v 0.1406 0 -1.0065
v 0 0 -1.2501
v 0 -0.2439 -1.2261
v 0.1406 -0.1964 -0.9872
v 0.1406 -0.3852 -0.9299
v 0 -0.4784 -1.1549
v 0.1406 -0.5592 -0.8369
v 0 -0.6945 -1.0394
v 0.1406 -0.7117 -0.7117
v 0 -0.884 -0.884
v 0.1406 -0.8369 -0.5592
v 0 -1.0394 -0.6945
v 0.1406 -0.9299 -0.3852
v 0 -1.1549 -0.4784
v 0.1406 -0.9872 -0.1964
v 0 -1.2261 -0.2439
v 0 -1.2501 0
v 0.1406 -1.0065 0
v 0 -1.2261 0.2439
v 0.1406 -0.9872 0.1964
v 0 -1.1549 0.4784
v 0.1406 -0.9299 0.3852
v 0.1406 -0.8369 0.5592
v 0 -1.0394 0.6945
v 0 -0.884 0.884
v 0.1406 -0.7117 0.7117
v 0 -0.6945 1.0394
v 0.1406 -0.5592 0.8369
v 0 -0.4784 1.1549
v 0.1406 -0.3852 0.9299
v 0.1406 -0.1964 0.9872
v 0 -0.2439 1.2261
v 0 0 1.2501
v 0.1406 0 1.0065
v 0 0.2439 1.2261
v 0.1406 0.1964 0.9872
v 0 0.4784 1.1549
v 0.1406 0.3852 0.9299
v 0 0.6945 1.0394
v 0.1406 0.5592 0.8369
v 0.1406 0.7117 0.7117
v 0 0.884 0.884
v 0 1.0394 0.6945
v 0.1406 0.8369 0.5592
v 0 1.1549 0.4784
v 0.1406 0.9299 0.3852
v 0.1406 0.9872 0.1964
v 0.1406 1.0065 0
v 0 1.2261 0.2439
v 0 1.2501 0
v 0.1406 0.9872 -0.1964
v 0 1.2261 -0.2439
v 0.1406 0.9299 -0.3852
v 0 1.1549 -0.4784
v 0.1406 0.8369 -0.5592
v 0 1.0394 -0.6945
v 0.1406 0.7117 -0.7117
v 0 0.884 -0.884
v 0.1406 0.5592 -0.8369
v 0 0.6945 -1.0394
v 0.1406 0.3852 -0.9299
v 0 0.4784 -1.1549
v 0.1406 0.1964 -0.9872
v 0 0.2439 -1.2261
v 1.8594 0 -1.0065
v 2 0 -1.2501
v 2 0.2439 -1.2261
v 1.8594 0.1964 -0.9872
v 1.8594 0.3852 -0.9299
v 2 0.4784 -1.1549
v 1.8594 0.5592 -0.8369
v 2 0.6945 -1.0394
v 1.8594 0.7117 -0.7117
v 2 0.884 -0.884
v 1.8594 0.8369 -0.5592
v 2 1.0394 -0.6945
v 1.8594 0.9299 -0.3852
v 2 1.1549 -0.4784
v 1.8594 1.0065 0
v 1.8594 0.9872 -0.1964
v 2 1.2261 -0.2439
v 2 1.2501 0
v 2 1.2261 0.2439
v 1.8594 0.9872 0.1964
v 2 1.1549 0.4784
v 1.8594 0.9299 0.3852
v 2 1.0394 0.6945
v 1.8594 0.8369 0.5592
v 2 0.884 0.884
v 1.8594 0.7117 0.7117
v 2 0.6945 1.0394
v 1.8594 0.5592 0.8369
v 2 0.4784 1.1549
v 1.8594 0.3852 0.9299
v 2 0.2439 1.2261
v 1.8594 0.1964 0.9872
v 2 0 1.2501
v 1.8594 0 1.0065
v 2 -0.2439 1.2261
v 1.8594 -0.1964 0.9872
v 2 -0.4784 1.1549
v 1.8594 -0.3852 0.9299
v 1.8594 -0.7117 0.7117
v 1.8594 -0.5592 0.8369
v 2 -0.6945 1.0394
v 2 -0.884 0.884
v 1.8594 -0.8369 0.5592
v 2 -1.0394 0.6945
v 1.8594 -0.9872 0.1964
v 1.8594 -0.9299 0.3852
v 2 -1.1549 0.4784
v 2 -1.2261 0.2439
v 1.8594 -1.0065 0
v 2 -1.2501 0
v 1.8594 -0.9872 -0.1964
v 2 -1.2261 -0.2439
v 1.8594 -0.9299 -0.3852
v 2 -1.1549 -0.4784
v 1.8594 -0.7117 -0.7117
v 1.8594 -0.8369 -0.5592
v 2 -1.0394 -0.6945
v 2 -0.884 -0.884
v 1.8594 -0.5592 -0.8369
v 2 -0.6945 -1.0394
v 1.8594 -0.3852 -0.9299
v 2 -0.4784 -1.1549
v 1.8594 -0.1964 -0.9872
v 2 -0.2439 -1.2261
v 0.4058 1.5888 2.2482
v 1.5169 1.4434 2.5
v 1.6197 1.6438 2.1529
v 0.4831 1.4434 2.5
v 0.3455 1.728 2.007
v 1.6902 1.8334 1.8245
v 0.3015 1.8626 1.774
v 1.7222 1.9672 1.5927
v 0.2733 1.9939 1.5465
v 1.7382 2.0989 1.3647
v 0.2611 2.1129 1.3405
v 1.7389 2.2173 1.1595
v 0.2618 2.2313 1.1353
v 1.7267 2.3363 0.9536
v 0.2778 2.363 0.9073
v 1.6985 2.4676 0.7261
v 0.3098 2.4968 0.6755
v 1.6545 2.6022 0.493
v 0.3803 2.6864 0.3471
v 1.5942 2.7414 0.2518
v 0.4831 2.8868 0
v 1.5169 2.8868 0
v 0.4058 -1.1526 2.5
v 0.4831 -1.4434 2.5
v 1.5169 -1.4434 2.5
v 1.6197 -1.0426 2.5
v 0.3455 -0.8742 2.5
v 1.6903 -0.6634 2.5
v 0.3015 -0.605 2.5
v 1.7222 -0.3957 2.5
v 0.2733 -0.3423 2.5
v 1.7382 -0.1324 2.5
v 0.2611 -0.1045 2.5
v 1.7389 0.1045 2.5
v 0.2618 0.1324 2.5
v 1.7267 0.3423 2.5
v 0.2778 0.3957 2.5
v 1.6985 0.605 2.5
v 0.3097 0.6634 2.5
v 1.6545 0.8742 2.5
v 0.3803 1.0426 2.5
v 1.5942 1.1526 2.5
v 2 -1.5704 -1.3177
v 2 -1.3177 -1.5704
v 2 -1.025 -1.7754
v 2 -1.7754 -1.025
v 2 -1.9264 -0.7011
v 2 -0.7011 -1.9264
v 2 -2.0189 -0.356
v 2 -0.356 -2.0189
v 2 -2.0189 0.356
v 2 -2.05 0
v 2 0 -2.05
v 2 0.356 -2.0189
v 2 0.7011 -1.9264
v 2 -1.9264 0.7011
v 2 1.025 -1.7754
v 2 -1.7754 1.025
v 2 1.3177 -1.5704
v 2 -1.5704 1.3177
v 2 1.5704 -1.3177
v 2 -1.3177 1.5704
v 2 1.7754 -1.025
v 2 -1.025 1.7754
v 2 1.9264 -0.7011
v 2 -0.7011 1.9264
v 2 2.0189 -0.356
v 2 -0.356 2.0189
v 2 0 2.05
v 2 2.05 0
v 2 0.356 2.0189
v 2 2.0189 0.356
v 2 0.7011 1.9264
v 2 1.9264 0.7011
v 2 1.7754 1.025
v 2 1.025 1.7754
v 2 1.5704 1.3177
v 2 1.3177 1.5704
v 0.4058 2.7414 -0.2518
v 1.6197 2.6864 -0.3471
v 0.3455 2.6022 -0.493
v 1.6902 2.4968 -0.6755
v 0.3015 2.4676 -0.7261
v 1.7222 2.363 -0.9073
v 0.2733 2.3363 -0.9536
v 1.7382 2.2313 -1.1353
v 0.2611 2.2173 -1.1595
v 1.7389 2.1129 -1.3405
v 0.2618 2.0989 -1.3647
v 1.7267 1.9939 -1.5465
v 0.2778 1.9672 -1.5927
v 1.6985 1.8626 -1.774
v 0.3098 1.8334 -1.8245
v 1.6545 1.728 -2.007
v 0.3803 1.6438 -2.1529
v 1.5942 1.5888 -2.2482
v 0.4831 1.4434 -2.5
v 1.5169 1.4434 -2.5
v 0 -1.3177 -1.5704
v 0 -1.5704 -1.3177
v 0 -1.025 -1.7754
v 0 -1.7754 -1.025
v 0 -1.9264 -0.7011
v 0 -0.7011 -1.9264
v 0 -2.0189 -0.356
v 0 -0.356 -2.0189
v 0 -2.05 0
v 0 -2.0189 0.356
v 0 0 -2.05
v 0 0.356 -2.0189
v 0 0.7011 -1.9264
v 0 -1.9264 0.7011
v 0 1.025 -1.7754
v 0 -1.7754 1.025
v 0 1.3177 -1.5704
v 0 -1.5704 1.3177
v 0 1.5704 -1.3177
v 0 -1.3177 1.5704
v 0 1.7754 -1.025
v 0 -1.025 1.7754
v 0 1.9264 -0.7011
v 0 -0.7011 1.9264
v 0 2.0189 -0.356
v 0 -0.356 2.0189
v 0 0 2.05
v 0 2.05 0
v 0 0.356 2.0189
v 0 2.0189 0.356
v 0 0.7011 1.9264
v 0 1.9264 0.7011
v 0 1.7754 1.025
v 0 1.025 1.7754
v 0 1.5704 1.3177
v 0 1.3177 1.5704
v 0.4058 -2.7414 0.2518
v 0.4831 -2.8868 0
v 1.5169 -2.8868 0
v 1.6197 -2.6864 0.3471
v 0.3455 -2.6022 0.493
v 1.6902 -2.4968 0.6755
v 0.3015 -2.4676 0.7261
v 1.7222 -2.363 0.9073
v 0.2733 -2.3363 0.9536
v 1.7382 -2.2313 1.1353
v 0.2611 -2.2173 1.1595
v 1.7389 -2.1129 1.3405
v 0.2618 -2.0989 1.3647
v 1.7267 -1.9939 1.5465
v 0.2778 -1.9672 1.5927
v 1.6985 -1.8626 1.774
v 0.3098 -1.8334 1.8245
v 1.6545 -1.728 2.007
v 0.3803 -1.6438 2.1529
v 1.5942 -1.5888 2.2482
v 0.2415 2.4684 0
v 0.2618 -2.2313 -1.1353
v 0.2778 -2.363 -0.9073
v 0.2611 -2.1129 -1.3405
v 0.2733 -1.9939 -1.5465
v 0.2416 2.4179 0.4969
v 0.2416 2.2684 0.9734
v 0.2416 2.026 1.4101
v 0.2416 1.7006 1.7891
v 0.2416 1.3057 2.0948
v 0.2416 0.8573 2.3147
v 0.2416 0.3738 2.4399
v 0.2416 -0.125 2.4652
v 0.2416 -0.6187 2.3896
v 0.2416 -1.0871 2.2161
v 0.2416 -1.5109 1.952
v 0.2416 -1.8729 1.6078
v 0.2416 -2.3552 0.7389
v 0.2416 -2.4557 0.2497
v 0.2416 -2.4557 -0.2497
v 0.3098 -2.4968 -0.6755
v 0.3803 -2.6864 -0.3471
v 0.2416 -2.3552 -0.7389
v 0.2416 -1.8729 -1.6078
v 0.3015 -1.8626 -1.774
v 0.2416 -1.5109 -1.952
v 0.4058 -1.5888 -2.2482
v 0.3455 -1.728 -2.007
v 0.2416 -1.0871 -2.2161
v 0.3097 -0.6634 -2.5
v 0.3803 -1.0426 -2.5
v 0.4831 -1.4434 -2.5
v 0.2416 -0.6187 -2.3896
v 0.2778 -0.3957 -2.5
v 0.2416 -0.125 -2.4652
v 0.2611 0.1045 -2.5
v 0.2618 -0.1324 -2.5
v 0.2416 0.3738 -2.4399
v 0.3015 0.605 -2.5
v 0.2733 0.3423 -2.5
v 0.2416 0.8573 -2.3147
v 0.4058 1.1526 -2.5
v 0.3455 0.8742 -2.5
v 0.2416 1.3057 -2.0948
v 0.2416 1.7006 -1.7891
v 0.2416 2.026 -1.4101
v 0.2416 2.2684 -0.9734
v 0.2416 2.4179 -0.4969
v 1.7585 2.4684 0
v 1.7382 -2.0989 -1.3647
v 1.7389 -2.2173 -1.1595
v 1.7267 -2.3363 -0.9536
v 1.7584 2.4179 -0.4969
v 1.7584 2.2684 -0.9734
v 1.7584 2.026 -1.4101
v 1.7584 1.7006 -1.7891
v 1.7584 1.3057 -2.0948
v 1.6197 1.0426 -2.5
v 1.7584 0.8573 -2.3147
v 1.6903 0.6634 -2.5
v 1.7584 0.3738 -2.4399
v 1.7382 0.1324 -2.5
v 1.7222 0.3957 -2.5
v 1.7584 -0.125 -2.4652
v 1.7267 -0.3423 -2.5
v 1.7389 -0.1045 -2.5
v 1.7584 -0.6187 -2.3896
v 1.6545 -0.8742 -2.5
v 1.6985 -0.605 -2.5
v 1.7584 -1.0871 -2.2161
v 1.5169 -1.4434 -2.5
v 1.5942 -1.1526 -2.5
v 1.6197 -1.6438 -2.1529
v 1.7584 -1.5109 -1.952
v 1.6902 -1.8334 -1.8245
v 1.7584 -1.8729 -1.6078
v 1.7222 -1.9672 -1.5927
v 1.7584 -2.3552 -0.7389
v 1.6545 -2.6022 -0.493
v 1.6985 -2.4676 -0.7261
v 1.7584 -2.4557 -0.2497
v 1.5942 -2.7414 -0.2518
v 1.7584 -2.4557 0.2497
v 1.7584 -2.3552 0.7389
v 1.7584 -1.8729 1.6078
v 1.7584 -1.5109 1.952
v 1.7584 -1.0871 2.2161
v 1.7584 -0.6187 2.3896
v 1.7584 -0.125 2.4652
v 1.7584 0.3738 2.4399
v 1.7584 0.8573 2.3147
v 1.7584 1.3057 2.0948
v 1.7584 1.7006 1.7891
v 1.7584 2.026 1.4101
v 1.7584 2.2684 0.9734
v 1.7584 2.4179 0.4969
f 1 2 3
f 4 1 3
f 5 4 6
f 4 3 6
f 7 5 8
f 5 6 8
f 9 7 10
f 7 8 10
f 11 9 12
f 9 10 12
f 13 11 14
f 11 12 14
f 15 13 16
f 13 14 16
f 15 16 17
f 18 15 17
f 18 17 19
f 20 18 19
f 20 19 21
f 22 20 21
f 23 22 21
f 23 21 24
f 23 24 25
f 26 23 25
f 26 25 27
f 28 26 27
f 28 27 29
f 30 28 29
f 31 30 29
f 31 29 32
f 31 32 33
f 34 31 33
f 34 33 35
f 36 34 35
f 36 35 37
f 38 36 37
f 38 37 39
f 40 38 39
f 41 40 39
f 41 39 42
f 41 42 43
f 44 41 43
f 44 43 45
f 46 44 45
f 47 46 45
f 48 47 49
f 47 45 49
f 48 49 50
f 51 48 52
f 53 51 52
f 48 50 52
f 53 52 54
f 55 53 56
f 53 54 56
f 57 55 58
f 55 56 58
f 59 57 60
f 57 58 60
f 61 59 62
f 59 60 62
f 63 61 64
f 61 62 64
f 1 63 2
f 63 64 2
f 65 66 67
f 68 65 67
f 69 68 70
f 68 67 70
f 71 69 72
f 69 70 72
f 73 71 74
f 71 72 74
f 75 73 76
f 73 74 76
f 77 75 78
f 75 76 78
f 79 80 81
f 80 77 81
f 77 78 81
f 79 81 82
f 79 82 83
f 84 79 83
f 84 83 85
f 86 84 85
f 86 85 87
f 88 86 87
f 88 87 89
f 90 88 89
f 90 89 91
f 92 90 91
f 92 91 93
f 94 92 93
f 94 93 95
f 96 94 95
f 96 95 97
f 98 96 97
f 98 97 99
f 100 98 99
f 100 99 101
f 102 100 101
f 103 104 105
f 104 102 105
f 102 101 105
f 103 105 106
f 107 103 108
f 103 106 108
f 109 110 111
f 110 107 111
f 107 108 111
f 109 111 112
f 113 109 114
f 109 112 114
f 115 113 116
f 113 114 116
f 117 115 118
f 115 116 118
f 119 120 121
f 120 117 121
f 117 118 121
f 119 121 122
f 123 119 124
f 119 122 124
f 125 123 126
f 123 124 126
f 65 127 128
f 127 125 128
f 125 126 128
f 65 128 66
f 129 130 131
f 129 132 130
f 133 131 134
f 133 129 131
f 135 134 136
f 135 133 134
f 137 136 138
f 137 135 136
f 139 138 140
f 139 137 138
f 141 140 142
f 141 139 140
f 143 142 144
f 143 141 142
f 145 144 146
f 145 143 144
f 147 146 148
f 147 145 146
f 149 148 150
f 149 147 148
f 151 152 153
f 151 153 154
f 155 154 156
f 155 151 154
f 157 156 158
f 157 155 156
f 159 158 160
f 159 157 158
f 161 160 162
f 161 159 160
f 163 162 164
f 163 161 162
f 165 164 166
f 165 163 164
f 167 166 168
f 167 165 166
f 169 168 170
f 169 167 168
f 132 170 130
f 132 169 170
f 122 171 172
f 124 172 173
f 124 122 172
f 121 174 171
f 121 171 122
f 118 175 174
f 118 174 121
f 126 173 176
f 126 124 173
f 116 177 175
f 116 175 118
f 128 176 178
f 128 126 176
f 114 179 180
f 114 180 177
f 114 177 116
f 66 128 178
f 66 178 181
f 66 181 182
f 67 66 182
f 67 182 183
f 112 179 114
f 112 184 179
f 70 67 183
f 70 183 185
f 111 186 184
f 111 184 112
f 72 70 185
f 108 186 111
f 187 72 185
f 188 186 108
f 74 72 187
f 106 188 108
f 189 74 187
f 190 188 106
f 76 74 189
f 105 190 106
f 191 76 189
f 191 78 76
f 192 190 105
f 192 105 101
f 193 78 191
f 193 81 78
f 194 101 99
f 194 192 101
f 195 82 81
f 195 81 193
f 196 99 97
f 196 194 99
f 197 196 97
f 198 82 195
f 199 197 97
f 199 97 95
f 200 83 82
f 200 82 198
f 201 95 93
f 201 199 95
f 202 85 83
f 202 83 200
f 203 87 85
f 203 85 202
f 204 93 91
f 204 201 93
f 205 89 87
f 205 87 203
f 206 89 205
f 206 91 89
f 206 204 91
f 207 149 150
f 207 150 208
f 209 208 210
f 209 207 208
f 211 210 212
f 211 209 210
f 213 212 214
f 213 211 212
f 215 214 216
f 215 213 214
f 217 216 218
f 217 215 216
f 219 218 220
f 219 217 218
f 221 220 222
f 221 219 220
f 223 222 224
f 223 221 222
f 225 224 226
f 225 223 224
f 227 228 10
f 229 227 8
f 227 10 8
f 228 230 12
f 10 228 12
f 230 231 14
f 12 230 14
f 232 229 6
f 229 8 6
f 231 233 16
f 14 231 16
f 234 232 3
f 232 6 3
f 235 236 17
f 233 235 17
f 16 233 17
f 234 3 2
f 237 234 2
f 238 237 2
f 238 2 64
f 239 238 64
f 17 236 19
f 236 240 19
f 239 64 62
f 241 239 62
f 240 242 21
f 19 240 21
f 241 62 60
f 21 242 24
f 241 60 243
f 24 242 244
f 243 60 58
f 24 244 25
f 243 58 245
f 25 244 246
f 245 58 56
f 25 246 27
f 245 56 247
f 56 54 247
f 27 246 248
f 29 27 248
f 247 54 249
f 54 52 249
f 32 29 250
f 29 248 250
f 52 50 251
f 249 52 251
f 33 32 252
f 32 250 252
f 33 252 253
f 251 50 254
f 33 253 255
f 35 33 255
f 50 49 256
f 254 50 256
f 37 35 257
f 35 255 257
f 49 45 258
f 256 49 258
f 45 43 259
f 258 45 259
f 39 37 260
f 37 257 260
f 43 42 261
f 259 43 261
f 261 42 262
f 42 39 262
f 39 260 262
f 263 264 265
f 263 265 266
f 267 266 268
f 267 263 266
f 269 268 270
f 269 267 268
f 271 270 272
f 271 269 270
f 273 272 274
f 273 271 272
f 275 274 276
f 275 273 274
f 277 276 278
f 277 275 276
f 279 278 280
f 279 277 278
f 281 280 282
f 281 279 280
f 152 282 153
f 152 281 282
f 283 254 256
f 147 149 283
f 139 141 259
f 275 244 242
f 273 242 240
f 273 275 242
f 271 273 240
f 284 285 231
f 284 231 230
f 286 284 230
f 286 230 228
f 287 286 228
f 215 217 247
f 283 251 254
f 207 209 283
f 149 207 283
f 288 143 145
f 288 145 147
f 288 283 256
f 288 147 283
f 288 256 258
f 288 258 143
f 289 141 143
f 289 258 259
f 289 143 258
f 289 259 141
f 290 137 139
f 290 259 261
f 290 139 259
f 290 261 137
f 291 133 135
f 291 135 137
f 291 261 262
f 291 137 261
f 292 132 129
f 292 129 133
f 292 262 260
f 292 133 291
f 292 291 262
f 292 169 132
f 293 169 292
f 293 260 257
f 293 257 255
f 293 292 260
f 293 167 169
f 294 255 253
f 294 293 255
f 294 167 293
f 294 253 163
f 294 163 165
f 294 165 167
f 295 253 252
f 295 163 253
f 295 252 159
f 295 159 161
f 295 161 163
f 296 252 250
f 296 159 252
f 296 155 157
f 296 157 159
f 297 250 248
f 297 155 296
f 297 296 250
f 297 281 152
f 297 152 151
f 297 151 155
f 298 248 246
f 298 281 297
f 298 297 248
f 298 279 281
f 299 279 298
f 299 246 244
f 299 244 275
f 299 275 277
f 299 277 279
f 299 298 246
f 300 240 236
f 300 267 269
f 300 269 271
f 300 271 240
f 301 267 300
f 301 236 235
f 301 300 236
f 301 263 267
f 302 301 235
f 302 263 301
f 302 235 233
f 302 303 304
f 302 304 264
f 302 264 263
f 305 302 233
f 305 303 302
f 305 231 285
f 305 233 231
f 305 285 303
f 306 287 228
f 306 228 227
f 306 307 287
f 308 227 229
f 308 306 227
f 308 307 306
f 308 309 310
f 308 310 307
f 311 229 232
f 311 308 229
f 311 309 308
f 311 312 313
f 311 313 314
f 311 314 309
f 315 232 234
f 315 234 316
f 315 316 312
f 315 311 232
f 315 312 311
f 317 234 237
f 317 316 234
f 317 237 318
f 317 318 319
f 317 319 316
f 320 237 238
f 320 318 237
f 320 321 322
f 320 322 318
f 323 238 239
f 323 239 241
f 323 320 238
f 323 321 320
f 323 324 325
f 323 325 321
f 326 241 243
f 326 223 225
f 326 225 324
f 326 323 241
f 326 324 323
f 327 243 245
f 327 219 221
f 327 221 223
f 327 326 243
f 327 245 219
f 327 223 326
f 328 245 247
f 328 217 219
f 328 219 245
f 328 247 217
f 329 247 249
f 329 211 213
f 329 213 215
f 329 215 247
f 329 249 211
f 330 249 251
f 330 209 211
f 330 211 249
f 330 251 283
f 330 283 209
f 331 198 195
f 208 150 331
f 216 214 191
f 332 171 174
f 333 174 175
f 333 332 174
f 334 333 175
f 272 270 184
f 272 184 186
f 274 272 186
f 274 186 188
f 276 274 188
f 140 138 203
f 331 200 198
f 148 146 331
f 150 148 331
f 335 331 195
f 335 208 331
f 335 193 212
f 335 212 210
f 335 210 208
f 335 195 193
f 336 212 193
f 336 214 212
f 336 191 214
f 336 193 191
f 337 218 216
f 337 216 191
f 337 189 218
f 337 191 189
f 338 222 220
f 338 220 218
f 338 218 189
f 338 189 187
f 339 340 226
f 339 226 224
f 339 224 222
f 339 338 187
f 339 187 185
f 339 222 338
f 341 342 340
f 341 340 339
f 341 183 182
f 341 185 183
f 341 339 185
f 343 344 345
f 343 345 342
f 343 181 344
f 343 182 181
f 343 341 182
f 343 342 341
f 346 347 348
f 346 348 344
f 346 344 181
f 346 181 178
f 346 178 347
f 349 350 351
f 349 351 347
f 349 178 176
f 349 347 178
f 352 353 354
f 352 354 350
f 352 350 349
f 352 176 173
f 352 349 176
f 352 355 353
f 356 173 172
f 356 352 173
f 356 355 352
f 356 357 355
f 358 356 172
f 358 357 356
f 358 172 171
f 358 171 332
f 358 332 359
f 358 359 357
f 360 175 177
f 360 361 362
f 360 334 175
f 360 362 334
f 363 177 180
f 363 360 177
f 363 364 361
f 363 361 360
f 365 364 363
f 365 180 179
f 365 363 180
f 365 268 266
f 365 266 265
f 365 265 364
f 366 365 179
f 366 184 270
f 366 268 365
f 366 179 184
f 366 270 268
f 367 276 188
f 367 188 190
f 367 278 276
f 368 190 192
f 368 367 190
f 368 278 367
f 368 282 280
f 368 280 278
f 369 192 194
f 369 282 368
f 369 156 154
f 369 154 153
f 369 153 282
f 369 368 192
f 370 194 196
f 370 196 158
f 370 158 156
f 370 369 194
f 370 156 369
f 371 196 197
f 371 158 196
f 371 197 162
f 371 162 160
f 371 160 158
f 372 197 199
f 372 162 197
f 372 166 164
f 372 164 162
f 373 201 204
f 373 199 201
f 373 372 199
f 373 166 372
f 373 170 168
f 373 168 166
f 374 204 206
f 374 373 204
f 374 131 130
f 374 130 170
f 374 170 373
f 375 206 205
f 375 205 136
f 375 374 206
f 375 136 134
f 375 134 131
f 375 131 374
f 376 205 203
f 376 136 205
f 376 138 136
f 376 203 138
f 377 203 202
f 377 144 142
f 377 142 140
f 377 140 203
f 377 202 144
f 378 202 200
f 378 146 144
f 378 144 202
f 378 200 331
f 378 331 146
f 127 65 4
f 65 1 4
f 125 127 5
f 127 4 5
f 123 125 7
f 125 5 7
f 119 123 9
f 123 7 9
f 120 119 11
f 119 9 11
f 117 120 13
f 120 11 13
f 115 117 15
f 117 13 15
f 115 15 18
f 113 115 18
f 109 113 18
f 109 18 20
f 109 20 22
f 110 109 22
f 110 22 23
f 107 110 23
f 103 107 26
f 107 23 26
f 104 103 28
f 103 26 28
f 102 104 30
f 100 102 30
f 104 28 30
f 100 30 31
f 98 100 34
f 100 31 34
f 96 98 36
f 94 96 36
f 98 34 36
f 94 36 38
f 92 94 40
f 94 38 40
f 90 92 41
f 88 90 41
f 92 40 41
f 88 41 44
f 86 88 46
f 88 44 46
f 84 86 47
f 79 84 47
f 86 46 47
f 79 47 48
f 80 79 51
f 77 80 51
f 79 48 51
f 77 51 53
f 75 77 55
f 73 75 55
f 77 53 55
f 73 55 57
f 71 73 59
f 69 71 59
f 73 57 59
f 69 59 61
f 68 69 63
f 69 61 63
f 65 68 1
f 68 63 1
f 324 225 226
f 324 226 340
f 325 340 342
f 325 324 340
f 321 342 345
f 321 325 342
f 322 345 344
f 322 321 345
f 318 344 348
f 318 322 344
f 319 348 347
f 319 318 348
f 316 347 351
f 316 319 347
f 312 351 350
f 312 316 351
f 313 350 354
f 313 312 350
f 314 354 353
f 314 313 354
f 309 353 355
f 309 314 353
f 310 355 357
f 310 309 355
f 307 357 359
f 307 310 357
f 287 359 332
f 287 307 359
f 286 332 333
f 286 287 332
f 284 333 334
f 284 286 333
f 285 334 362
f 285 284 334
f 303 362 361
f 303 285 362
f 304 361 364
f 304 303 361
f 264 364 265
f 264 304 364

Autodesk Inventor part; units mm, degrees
ref_plane "YZ Plane" through (0, 0, 0) normal (1, 0, 0) x (0, 1, 0)
ref_plane "XZ Plane" through (0, 0, 0) normal (0, 1, 0) x (-1, 0, 0)
sketch "Szkic1" plane through (0, 0, 0) normal (1, 0, 0) x (0, 1, 0)
  line L0 (-2.8868, 0) -> (-1.4434, 2.5)
  line L1 (-1.4434, 2.5) -> (1.4434, 2.5)
  line L2 (1.4434, 2.5) -> (2.8868, 0)
  line L3 (2.8868, 0) -> (1.4434, -2.5)
  line L4 (1.4434, -2.5) -> (-1.4434, -2.5)
  line L5 (-1.4434, -2.5) -> (-2.8868, 0)
  point P0 (0, 0)
  point P1 (0, 0)
  dimension "d0" = 5.7735
extrude "Bryła" add sketch "Szkic1" along normal blind 2
sketch "Szkic2" plane through (0, 0, 0) normal (0, 0, 1) x (1, 0, 0)
  line L0 (0, 1.4434) -> (0, 2.8868) projected
  line L1 (0, 2.8868) -> (2, 2.8868) projected
  line L2 (2, 1.4434) -> (2, 2.8868) projected
  line L3 (-0.4, 0) -> (2.4, 0) projected
  line L4 (0.4831, 2.8868) -> (0, 2.05)
  line L5 (1.5169, 2.8868) -> (2, 2.05)
  dimension "d3" = 30
  dimension "d4" = 30
  dimension "d5" = 4.1
  dimension "d6" = 4.1
revolve "Faza1" cut sketch "Szkic2" angle 360 about axis through (-10, 0, 0) along (1, 0, 0)
sketch "Szkic3" plane through (2, 0, 0) normal (1, 0, 0) x (0, 0, -1)
  arc A0 (-0.625, -1.0825) -> (0.625, -1.0825) centre (0, 0) ccw projected
hole "Gwint" at (2, 0, 0) direction (-1, 0, 0) diameter 2.013 end through all thread size "M2.5x0.45" class "6H" standard "ISO Metric profile"
chamfer "Faza2" distance 0.2436 angle 30 1 edges at (2, 0, 1.0065) measured on face at (2, 1.6799, -0.204)
chamfer "Faza3" distance 0.2436 angle 30 1 edges at (0, 0, 1.0065) measured on face at (0, 1.6799, -0.204)
ref_plane "Work Plane1" through (-5.8951, 0, 0) normal (0, -0.866, -0.5) x (1, 0, 0)
equation "\"d0\" = 1.1547 * SW"
equation "\"d1\" = KOH"
equation "\"d3\" = ANG1"
equation "\"d4\" = ANG2"
equation "\"d5\" = SW0"
equation "\"d6\" = SW01"
equation "\"d8\" = -0.5 * GD1 + 0.5 * NND"
equation "\"d40\" = -0.5 * GD1 + 0.5 * NND"
equation "\"d10\" = -0.5 * GD1 + 0.5 * NND"
equation "\"d41\" = -0.5 * GD1 + 0.5 * NND"
equation "\"ANG1\" = 30deg"
equation "\"ANG2\" = 30deg"
equation "\"NND\" = 2.5"
equation "\"KOH\" = 2"
equation "\"SW\" = 5"
equation "\"SW0\" = SW01"
equation "\"SW01\" = 4.1"
equation "\"GUL\" = 0.541266 * PTC"
equation "\"THREADDIA\" = 2.5"
equation "\"TOA\" = 30deg"
equation "\"PTC\" = 0.45"
equation "\"E0\" = 1.155 * SW"
equation "\"GAL\" = 0.541266 * PTC"
equation "\"GD1\" = 2.012861"
properties part number "DIN 934 - M2,5" material "Stal, miękka"
